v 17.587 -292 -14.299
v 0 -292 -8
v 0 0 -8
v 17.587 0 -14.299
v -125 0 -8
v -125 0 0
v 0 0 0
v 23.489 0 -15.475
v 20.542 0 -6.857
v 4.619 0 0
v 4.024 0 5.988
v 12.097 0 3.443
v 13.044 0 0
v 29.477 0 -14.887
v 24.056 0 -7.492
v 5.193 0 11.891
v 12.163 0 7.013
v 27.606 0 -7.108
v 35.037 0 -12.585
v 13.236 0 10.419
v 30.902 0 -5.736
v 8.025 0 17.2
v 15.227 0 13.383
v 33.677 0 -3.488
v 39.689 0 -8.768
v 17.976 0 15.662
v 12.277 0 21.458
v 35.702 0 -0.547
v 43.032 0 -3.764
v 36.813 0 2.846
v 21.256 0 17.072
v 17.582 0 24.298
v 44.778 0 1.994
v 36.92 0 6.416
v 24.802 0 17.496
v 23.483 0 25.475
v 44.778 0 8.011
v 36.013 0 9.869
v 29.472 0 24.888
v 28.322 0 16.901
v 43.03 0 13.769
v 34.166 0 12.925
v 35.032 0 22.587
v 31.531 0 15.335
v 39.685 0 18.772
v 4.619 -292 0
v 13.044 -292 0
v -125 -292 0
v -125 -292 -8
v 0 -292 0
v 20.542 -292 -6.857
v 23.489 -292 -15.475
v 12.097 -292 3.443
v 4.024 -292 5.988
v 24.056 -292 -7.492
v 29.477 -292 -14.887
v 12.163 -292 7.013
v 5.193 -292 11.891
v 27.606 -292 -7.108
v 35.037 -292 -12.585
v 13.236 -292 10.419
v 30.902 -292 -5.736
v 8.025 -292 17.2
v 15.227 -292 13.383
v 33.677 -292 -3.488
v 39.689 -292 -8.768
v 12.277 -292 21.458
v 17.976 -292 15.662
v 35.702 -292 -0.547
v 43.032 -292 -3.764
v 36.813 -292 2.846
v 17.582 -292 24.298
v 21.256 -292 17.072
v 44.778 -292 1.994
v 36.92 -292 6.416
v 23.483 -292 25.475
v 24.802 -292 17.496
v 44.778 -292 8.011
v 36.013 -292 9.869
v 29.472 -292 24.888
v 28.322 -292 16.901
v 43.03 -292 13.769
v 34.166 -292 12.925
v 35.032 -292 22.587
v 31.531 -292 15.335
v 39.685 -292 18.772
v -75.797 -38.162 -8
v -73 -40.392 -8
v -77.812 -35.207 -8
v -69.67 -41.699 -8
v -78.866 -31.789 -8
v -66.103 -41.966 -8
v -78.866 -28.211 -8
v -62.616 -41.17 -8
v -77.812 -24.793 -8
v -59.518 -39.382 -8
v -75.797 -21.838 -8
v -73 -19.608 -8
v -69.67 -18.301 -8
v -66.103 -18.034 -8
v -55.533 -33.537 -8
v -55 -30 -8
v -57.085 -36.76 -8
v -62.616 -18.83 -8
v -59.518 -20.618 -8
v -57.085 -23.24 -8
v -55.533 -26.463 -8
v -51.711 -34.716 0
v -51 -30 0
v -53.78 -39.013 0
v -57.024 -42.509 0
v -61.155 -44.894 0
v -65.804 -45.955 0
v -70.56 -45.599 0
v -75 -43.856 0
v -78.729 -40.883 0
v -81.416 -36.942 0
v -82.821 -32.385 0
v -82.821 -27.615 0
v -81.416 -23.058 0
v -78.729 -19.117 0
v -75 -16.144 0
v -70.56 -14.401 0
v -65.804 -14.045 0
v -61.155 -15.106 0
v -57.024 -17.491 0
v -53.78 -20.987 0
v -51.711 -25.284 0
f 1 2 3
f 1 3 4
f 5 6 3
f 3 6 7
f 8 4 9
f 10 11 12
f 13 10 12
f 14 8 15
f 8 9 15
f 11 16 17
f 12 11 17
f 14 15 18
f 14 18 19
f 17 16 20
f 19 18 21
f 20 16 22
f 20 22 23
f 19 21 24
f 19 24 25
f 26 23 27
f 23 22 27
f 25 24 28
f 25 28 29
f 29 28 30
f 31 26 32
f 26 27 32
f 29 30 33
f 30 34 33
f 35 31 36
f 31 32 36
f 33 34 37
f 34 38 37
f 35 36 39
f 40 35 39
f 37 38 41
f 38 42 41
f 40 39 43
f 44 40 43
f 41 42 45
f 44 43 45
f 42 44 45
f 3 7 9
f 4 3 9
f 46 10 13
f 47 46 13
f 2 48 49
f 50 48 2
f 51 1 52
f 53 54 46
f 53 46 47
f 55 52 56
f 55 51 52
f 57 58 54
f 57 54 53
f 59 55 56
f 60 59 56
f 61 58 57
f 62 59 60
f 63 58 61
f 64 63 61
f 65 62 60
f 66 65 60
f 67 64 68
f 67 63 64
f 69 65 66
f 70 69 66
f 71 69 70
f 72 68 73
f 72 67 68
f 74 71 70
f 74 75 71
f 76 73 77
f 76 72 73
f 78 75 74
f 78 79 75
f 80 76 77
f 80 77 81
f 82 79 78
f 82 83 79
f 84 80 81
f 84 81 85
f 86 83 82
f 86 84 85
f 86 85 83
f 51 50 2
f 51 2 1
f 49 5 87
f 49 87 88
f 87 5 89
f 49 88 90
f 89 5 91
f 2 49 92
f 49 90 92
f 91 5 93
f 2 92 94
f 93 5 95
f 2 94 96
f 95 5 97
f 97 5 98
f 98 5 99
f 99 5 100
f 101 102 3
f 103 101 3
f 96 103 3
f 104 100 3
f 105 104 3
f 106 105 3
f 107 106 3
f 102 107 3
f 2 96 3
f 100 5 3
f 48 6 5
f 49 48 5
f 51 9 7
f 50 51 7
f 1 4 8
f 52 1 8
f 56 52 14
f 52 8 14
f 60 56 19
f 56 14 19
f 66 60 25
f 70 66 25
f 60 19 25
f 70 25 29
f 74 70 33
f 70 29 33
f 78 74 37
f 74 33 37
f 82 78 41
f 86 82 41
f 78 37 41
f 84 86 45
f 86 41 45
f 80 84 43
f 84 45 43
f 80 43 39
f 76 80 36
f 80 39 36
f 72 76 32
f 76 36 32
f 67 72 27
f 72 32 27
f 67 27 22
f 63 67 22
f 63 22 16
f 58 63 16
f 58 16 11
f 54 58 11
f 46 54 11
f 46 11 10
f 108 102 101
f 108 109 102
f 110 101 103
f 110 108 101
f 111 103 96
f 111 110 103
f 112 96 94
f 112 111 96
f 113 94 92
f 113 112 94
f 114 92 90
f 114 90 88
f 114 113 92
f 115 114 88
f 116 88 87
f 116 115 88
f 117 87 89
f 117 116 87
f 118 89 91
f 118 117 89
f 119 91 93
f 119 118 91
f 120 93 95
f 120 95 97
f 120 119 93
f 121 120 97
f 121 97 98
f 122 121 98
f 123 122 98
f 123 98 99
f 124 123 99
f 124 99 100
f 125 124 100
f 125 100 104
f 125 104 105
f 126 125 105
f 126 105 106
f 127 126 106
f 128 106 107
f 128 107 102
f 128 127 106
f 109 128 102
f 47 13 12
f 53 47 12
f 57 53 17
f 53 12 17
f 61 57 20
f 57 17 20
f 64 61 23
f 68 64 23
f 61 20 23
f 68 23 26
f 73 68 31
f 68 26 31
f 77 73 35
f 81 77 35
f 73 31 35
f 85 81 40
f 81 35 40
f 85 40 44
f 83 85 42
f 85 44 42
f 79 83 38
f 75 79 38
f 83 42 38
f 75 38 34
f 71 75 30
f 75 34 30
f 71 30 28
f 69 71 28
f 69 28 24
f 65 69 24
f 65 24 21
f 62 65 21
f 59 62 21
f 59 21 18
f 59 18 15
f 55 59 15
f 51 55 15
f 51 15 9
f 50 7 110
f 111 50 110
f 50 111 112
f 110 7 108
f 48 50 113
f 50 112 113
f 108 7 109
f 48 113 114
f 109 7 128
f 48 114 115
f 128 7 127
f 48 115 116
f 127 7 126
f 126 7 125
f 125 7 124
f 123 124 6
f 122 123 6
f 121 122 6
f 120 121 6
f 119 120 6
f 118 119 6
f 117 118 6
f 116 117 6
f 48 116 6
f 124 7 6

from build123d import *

# Parameters (mm, degrees)
F1_DEPTH = 292
F3_R     = 12
F2_R     = 16


with BuildPart() as f1:
    # F0 (on Front) → F1 (new body)
    with BuildSketch(Plane.XZ):
        with BuildLine():
            Line((20.542224, -6.856897), (0, 0))
            Line((0, 0), (-125, 0))
            Line((-125, 0), (-125, -8))
            Line((-125, -8), (0, -8))
            Line((0, -8), (17.58743, -14.299388))
            ThreePointArc((17.58743, -14.299388), (39.685209, 18.77169), (4.619105, 0))
            Line((4.619105, 0), (13.043561, 0))
            ThreePointArc((13.043561, 0), (32.935269, 14.224762), (20.542224, -6.856897))
        make_face()
    extrude(amount=F1_DEPTH)

    # F3 (on face) → F4 section 0
    with BuildSketch(Plane(origin=(0, 0, -8), x_dir=(1, 0, 0), z_dir=(0, 0, -1))):
        with Locations((-67, 30)):
            Circle(F3_R)
    # F2 (on face) → F4 section 1
    with BuildSketch(Plane.XY):
        with Locations((-67, -30)):
            Circle(F2_R)
    loft(mode=Mode.SUBTRACT)


solid = f1.part
